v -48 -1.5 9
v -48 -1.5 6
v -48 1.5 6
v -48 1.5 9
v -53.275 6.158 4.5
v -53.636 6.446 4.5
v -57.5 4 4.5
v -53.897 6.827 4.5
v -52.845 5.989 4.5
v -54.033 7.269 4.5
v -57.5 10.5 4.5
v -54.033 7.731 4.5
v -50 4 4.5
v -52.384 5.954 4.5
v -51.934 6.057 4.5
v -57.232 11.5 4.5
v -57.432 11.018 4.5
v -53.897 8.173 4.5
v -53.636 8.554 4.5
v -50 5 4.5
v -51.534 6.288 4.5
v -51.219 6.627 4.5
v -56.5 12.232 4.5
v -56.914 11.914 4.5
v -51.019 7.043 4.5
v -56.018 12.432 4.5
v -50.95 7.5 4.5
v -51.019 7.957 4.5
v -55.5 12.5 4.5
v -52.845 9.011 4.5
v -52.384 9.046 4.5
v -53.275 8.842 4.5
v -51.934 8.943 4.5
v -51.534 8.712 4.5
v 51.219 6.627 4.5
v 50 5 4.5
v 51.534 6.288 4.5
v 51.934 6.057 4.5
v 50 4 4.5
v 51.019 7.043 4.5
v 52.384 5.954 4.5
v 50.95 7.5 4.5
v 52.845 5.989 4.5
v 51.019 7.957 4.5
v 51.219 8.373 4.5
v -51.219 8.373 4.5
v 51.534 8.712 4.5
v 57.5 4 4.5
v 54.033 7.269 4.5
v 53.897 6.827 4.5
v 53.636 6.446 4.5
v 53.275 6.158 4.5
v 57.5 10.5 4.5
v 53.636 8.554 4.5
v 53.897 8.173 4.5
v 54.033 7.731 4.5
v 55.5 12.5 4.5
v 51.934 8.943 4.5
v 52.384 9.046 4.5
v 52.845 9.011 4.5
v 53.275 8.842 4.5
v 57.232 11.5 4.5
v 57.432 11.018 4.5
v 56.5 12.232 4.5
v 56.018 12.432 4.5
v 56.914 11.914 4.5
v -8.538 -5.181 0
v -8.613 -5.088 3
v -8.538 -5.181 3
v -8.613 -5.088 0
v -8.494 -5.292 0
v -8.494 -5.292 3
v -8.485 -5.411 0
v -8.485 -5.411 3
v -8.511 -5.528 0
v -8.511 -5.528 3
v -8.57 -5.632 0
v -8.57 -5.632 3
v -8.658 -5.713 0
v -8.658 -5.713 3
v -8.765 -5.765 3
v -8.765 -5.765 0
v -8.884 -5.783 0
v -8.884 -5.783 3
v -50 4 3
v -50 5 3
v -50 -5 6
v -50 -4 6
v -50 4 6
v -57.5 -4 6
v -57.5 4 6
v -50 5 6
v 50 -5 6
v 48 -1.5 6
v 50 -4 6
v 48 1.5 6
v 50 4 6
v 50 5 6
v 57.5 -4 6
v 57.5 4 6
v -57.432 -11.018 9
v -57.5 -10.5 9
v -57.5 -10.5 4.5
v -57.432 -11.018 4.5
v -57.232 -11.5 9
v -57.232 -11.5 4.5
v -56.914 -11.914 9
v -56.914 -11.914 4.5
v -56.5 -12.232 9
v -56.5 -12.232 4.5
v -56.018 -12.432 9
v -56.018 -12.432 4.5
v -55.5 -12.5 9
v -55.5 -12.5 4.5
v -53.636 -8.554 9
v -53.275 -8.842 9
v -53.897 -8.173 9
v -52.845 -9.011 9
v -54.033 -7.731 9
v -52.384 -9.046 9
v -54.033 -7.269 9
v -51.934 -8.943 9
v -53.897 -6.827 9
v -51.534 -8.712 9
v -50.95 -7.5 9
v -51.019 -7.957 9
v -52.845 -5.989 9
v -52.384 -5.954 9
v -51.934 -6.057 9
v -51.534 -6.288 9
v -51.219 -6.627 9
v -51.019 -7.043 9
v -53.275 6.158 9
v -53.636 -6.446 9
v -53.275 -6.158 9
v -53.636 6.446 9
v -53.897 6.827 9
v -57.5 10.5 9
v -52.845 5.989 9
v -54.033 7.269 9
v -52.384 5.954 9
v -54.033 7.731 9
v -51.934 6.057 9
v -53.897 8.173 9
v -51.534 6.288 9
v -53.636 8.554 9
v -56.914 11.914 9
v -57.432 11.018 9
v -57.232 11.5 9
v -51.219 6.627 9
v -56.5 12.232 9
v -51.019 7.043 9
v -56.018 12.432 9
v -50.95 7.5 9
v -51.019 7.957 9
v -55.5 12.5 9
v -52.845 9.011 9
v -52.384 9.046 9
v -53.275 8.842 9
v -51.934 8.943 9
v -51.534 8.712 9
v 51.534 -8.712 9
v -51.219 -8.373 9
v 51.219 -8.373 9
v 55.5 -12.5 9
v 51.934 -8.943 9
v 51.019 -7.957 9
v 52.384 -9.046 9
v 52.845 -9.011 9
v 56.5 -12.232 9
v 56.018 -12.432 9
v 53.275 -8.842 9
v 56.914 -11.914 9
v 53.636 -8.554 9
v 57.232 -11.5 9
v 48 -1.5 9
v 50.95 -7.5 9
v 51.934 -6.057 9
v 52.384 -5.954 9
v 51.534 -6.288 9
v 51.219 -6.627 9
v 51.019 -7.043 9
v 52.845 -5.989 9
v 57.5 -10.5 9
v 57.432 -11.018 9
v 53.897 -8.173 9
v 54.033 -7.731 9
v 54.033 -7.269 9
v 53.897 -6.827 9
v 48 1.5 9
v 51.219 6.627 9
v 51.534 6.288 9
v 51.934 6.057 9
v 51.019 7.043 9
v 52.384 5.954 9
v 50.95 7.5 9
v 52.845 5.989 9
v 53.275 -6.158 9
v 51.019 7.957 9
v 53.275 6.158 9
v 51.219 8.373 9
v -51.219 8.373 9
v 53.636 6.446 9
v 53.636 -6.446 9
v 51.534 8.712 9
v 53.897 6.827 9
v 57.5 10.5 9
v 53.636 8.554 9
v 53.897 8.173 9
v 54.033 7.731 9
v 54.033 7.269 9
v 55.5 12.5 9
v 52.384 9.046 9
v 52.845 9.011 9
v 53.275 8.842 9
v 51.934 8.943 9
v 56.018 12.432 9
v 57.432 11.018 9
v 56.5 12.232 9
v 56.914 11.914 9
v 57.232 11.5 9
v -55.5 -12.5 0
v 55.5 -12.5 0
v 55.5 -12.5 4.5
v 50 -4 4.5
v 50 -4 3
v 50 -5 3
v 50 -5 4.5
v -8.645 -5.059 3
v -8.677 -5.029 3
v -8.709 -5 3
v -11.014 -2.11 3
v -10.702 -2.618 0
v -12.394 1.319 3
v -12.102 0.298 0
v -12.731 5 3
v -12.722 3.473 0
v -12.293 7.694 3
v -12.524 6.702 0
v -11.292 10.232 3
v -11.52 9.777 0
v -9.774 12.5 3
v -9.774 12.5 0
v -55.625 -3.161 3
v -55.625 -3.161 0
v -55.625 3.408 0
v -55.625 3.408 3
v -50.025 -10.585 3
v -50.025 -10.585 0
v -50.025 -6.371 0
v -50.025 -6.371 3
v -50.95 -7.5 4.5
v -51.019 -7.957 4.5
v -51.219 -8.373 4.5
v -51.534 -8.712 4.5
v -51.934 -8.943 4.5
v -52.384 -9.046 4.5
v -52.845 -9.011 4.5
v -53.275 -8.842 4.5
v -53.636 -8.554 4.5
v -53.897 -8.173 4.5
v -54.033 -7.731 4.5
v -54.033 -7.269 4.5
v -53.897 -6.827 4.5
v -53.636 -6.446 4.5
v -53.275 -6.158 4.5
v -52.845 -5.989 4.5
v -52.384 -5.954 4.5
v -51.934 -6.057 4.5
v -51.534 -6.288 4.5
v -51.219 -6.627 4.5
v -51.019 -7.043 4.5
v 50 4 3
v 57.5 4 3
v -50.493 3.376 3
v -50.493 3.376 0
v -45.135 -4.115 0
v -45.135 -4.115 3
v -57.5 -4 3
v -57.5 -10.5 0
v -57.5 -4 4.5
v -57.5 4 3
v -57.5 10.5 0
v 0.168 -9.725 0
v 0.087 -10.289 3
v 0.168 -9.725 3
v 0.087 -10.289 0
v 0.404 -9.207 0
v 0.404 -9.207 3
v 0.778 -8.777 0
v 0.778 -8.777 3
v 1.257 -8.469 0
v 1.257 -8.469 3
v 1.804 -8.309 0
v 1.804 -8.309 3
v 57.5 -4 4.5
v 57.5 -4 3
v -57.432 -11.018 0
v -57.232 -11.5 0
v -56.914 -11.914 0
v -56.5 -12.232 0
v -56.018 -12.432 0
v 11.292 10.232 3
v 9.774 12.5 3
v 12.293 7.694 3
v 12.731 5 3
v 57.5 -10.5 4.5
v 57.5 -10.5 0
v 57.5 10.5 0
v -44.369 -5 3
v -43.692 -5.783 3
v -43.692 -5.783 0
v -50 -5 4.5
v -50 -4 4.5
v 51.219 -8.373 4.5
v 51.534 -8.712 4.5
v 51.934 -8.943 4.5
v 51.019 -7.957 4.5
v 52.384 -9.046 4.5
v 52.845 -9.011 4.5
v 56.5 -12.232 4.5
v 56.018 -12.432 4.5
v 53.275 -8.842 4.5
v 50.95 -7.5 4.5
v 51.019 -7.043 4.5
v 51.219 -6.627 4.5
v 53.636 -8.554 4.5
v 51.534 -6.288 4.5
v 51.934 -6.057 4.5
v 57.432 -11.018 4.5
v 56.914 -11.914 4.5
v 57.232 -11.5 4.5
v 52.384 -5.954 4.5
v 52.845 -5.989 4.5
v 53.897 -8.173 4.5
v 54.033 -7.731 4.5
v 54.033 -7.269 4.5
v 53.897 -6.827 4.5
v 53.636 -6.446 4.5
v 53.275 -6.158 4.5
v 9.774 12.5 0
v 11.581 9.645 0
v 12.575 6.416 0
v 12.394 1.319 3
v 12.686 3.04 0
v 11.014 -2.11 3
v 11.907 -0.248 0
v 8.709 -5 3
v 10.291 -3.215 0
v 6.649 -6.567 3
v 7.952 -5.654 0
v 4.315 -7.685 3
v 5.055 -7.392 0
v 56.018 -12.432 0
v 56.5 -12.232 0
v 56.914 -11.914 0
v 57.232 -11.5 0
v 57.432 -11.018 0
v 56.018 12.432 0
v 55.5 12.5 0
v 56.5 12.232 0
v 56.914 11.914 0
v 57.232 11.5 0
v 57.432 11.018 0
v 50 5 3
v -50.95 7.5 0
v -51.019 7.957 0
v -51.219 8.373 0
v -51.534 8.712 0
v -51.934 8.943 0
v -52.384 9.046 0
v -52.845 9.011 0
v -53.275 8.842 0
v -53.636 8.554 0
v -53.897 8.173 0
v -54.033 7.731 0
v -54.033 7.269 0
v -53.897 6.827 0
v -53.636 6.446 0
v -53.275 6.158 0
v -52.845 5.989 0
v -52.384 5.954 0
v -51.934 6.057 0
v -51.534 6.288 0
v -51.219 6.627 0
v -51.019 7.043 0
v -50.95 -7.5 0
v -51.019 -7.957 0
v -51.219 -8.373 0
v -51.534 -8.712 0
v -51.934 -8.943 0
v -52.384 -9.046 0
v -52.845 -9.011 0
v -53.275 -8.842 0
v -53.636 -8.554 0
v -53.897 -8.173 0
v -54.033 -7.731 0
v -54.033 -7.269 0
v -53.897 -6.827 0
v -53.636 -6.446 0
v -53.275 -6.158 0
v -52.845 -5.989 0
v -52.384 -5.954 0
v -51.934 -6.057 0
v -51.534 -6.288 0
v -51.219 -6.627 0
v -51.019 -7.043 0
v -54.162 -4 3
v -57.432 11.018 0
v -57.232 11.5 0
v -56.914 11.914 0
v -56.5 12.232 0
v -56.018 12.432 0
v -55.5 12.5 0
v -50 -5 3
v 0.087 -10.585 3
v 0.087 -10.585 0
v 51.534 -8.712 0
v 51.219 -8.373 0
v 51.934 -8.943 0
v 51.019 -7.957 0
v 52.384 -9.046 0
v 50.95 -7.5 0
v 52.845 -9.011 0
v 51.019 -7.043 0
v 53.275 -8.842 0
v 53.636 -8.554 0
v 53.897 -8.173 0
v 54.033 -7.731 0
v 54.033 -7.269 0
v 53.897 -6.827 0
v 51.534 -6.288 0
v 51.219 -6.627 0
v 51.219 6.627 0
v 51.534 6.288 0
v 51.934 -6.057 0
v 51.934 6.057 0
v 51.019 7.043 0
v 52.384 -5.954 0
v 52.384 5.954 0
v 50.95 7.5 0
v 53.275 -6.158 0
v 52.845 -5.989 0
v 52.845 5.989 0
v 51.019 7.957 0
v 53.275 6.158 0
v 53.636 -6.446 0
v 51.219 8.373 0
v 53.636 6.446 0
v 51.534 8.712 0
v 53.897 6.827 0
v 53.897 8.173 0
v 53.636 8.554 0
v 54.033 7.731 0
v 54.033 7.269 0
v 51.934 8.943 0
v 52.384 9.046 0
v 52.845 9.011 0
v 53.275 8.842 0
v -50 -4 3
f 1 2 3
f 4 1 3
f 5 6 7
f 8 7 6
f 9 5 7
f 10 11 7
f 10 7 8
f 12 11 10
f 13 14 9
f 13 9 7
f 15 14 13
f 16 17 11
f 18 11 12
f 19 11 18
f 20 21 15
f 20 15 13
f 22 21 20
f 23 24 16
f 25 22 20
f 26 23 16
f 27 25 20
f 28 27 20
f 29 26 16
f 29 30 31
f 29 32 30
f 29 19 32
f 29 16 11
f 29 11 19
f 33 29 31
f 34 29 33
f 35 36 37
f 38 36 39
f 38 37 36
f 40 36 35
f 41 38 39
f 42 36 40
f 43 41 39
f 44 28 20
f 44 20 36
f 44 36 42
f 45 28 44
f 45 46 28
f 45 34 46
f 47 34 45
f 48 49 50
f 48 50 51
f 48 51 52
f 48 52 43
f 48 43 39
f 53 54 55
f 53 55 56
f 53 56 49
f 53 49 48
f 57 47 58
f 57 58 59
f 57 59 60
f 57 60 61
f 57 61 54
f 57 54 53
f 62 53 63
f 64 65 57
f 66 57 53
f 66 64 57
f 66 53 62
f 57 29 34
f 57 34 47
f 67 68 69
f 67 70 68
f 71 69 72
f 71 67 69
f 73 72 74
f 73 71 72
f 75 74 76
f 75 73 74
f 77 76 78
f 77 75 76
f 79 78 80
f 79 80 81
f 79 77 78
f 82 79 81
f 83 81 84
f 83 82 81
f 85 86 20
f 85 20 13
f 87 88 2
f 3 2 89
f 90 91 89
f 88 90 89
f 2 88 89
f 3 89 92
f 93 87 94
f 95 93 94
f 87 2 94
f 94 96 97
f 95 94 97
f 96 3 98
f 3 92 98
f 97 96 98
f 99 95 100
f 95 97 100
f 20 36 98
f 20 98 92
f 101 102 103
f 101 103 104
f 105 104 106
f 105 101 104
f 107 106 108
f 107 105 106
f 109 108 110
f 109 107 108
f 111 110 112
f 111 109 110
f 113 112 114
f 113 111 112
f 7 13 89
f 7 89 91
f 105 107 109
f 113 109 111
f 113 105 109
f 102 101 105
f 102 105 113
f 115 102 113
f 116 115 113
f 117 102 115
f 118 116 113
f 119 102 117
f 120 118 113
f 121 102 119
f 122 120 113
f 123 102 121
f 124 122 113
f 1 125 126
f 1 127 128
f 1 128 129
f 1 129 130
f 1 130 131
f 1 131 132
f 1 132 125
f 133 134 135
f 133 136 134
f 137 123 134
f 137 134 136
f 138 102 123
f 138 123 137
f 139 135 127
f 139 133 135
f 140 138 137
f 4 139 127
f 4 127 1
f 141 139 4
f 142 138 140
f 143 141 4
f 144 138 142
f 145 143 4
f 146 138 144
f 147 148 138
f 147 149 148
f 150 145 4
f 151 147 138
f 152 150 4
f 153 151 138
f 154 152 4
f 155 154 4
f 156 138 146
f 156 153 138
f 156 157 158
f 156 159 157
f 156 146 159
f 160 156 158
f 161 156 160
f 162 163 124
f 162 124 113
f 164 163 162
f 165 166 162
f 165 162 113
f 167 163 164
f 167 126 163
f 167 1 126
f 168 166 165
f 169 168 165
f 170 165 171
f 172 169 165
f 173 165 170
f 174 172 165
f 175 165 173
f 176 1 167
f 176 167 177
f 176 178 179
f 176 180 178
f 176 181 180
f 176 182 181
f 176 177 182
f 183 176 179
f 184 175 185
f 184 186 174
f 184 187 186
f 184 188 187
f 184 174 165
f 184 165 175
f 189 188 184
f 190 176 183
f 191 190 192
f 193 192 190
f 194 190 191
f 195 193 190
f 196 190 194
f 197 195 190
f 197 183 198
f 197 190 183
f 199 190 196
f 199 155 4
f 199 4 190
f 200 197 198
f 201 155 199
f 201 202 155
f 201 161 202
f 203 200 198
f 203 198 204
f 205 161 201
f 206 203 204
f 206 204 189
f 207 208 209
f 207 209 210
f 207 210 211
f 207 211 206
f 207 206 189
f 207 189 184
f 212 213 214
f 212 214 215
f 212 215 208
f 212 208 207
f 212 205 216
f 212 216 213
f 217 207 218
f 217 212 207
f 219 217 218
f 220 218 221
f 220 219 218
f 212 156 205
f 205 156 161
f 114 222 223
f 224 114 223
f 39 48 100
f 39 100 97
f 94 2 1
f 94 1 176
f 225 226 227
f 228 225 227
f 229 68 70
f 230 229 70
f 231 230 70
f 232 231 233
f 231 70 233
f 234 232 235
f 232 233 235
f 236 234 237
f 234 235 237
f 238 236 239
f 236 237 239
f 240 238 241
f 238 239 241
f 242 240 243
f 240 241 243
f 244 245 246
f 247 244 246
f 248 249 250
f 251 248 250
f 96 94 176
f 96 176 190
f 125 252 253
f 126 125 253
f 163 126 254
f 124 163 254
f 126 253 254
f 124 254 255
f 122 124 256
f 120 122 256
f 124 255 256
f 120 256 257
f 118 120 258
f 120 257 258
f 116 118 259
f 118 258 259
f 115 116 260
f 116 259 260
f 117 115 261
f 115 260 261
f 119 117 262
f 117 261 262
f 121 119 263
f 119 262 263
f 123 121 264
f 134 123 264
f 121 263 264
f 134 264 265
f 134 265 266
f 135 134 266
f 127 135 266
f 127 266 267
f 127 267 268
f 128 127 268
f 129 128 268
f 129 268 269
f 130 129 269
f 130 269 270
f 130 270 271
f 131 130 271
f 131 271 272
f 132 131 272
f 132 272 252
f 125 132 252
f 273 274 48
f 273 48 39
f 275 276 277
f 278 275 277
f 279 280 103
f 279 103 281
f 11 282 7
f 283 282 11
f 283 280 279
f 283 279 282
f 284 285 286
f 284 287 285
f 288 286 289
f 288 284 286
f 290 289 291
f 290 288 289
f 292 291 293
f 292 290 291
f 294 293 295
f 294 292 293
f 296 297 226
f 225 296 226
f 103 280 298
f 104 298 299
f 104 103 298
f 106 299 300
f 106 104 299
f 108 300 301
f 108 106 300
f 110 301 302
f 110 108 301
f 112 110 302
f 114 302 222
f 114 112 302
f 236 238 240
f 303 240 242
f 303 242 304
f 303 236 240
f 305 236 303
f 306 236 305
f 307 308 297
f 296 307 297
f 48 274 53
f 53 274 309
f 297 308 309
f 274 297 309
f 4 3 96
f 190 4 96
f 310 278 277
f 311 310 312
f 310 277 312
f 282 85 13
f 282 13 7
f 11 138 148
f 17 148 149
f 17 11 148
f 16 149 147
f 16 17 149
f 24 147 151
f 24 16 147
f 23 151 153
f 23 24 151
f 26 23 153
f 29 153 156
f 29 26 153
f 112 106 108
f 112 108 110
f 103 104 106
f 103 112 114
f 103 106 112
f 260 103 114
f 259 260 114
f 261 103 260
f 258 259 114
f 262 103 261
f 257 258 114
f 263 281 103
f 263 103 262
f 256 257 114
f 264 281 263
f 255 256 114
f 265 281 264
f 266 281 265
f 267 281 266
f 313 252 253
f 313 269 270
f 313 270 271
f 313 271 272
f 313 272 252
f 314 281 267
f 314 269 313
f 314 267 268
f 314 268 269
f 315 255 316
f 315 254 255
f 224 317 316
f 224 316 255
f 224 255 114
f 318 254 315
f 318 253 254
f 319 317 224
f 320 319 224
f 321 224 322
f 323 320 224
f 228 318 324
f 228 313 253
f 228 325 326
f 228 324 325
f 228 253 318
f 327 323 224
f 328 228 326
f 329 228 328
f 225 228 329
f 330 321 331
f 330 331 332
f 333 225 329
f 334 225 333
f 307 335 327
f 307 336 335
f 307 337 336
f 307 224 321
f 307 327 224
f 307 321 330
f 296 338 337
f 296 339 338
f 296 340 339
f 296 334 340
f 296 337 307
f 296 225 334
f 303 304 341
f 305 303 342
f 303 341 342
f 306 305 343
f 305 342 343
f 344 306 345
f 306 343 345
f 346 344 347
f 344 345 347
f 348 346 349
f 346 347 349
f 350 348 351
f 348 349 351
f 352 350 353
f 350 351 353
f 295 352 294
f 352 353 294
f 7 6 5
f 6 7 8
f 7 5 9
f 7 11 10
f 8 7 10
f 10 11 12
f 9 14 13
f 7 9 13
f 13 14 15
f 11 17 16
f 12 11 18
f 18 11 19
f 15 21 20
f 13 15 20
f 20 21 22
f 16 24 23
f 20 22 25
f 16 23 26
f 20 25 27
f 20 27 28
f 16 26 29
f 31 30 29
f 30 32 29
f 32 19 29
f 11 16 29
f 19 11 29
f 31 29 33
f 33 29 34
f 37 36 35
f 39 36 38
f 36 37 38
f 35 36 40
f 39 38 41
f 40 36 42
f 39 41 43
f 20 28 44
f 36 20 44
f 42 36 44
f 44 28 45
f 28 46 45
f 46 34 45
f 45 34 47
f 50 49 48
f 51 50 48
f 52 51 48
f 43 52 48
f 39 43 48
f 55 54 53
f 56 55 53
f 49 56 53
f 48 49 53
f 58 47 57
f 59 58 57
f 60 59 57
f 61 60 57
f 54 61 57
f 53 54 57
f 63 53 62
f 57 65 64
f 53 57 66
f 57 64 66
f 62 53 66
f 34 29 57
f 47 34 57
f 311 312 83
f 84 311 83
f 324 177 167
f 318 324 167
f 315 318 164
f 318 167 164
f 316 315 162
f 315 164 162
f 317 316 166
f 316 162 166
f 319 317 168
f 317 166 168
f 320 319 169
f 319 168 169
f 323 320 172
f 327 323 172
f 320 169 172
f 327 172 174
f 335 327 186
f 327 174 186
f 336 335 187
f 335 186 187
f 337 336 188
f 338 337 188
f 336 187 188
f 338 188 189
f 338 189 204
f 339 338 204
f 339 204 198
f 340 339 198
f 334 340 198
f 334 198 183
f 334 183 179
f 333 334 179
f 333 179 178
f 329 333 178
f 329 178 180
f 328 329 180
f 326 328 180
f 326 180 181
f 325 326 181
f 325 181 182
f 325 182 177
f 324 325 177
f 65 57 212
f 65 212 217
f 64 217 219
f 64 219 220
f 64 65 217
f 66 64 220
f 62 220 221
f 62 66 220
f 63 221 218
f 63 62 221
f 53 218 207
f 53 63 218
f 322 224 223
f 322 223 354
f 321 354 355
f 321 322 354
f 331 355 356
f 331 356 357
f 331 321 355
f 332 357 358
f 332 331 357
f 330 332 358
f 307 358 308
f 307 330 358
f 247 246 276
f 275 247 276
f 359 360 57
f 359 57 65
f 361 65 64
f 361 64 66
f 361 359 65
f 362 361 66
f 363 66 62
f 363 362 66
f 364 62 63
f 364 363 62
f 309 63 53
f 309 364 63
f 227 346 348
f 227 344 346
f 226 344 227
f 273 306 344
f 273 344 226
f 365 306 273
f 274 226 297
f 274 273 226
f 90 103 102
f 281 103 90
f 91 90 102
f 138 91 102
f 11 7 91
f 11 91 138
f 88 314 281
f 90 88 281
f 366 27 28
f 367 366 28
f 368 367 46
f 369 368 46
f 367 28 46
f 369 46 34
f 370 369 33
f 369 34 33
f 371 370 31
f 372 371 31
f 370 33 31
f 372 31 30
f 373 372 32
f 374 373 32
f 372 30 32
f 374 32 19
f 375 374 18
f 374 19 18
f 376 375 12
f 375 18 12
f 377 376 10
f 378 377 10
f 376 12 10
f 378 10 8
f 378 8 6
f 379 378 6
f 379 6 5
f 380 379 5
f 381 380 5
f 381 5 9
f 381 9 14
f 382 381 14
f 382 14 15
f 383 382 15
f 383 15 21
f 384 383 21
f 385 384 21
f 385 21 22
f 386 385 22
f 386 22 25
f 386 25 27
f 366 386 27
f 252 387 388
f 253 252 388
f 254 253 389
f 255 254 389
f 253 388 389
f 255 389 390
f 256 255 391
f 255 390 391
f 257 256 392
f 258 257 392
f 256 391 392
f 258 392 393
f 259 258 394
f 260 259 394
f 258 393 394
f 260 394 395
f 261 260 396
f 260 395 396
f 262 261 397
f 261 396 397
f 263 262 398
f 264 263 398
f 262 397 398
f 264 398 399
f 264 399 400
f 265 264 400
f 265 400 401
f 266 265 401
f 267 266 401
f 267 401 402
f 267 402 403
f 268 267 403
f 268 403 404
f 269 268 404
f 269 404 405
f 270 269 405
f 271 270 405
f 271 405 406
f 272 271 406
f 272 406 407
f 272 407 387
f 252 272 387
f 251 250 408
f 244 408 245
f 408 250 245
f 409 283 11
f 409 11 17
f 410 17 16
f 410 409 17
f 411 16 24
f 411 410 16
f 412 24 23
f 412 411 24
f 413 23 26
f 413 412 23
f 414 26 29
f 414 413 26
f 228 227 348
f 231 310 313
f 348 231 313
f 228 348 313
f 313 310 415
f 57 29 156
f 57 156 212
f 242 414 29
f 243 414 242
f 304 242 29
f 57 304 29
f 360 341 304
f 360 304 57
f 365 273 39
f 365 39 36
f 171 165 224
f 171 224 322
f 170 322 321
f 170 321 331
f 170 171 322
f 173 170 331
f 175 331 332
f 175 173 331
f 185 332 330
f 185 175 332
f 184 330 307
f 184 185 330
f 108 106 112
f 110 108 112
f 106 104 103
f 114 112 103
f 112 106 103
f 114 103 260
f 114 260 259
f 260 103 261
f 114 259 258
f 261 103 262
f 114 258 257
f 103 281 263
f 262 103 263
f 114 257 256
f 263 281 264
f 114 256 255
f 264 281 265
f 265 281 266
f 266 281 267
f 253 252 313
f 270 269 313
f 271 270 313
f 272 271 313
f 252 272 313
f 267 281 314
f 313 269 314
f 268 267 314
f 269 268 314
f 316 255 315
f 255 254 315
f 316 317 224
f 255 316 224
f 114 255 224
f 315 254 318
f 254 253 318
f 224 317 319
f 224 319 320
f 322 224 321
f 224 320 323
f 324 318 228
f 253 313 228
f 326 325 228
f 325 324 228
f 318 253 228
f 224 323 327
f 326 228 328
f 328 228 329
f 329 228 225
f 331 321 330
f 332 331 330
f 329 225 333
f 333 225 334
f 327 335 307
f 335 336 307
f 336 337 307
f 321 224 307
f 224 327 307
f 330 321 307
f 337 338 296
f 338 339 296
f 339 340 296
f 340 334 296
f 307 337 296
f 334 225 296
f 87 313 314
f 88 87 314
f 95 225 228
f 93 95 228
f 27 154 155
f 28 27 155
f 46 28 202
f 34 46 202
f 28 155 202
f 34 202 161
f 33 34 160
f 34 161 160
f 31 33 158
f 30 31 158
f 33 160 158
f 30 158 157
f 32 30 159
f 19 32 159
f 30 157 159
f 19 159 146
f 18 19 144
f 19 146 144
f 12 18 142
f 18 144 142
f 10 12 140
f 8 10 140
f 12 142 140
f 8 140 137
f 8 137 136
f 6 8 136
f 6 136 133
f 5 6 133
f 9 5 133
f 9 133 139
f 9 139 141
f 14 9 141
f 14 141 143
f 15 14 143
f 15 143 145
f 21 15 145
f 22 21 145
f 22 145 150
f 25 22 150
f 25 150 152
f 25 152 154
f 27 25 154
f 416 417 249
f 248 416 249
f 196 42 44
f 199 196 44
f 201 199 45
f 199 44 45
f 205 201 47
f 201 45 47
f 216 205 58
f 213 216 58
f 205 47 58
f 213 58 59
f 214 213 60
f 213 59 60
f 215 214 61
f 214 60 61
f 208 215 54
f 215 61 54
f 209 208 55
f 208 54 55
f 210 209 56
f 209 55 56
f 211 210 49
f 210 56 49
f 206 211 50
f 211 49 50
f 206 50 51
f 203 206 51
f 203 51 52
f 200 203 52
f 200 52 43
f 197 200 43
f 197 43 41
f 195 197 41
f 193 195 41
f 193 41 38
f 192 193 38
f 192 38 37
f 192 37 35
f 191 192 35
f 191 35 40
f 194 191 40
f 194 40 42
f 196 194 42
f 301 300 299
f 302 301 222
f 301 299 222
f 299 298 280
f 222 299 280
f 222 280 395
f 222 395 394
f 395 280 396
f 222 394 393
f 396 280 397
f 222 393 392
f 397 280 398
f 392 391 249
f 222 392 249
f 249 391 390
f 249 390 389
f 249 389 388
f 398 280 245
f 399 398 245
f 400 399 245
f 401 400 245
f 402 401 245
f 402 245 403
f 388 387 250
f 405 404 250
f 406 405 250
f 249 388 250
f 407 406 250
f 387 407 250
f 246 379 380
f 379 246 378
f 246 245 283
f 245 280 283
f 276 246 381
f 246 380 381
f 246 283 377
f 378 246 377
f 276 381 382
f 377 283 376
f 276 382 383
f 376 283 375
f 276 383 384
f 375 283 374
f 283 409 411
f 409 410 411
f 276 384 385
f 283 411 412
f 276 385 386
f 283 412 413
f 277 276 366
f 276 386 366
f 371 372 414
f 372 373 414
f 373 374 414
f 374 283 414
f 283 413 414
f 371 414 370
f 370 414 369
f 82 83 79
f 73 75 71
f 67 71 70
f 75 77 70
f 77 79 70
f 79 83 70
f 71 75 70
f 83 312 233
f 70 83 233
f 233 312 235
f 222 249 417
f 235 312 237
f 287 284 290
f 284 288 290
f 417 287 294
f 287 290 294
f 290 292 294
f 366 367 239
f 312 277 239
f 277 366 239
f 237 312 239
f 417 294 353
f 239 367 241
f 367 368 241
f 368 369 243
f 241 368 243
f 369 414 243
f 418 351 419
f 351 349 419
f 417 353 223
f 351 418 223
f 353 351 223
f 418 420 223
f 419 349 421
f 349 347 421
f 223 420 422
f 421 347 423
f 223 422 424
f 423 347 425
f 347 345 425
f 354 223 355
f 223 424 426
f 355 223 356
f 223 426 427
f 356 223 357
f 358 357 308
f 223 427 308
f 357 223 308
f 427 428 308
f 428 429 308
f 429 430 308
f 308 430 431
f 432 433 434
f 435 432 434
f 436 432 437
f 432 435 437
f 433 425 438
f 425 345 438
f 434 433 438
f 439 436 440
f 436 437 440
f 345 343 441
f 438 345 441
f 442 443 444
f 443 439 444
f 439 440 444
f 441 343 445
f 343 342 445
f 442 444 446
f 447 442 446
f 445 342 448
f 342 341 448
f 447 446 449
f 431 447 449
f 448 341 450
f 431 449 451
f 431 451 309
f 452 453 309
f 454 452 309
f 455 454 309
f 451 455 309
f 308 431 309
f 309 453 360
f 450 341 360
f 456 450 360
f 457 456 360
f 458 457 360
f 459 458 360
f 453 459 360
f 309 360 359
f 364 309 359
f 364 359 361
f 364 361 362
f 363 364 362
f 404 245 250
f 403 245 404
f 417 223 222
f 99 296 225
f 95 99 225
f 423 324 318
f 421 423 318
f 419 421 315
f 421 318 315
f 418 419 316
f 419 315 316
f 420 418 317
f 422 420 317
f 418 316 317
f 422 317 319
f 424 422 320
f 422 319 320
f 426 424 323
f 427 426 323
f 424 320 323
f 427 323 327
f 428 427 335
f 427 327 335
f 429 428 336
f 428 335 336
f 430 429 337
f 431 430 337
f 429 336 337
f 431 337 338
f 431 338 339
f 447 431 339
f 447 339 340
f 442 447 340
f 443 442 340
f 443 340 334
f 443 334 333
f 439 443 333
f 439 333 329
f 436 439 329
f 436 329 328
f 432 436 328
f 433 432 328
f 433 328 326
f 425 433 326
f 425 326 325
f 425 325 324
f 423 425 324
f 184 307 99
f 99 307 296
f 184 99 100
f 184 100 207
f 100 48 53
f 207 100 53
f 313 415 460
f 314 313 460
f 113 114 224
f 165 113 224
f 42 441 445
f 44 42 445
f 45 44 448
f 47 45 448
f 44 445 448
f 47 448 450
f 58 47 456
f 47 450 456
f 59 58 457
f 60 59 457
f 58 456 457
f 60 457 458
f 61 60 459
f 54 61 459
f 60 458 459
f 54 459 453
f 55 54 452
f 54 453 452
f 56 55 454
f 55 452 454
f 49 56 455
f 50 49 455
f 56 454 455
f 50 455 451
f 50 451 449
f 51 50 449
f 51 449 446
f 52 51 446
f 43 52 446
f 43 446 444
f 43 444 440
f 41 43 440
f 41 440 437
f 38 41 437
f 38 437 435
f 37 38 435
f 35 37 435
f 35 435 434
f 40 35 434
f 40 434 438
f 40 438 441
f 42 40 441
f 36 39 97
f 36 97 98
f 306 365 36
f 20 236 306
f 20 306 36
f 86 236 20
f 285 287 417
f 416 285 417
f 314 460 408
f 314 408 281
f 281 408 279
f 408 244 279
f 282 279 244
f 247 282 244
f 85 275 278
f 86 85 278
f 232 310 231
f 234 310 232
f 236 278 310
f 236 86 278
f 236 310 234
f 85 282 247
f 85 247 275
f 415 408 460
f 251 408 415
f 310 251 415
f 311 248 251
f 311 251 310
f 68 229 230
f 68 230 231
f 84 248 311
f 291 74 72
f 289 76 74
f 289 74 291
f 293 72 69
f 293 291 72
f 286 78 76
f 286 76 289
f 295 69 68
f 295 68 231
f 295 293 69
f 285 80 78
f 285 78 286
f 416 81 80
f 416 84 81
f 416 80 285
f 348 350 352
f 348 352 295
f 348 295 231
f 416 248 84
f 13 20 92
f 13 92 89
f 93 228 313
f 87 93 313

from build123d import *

# Parameters (mm, degrees)
BOX_BOTTOM_HALF_0_W     = 117
BOX_BOTTOM_HALF_0_H     = 27
BOX_BOTTOM_HALF_0_DEPTH = 5.5
SKETCH_W                = 115
SKETCH_H                = 25
PAD_DEPTH               = 3
PAD001_DEPTH            = 3
SKETCH002_W             = 115
SKETCH002_H             = 25
SKETCH002_W_2           = 96
SKETCH002_H_2           = 3
PAD002_DEPTH            = 3
SKETCH003_R             = 1.55
POCKET_DEPTH            = 245.060315
POLARPATTERN_COUNT      = 2
POLARPATTERN001_COUNT   = 2
POLARPATTERN002_COUNT   = 2
FILLET_R                = 2
SKETCH004_R             = 12.75
POCKET001_DEPTH         = 3
POCKET002_DEPTH         = 3
FILLET001_R             = 0.4
FILLET002_R             = 2


with BuildPart() as box_bottom_half_0_body:
    # box_bottom_half_0 → box_bottom_half_0 (new body)
    with BuildSketch(Plane(origin=(-58.5, -13.5, -1), x_dir=(1, 0, 0), z_dir=(0, 0, 1))):
        with Locations((58.5, 13.5)):
            Rectangle(BOX_BOTTOM_HALF_0_W, BOX_BOTTOM_HALF_0_H)
    extrude(amount=BOX_BOTTOM_HALF_0_DEPTH)


with BuildPart() as body:
    # Sketch → Pad (new body)
    with BuildSketch(Plane.XY):
        Rectangle(SKETCH_W, SKETCH_H)
    extrude(amount=PAD_DEPTH)

    # Sketch001 (on Face6 of Pad) → Pad001 (join)
    with BuildSketch(Plane.XY.offset(3)):
        Polygon((-57.5, 12.5), (57.5, 12.5), (57.5, 4), (50, 4), (50, 5), (-50, 5), (-50, 4), (-57.5, 4), align=None)
        Polygon((-57.5, -12.5), (57.5, -12.5), (57.5, -4), (50, -4), (50, -5), (-50, -5), (-50, -4), (-57.5, -4), align=None)
    extrude(amount=PAD001_DEPTH)

    # Sketch002 (on Face12 of Pad001) → Pad002 (join)
    with BuildSketch(Plane.XY.offset(6)):
        Rectangle(SKETCH002_W, SKETCH002_H)
        Rectangle(SKETCH002_W_2, SKETCH002_H_2, mode=Mode.SUBTRACT)
    extrude(amount=PAD002_DEPTH)

    # Sketch003 (on Face26 of Pad002) → Pocket (cut, through all)
    with BuildSketch(Plane.XY.offset(9)):
        with Locations((-52.5, 7.5)):
            Circle(SKETCH003_R)
    pocket = extrude(amount=-POCKET_DEPTH, mode=Mode.SUBTRACT)

    # PolarPattern: Pocket ×2 about axis
    polarpattern_axis = Axis((0, 0, 0), (0, 1, 0))
    for i in range(1, POLARPATTERN_COUNT):
        add(pocket.rotate(polarpattern_axis, i * 360 / POLARPATTERN_COUNT), mode=Mode.SUBTRACT)

    # PolarPattern001: Pocket ×2 about axis
    polarpattern001_axis = Axis((0, 0, 0), (1, 0, 0))
    for i in range(1, POLARPATTERN001_COUNT):
        add(pocket.rotate(polarpattern001_axis, i * 360 / POLARPATTERN001_COUNT), mode=Mode.SUBTRACT)

    # PolarPattern002: Pocket ×2 about axis
    polarpattern002_axis = Axis((0, 0, 9), (0, 0, 1))
    for i in range(1, POLARPATTERN002_COUNT):
        add(pocket.rotate(polarpattern002_axis, i * 360 / POLARPATTERN002_COUNT), mode=Mode.SUBTRACT)

    # Fillet
    fillet_edges = [body.edges().sort_by_distance(p)[0] for p in [
        (57.5, 12.5, 7.5),
        (57.5, 12.5, 4.5),
        (57.5, 12.5, 1.5),
        (57.5, -12.5, 7.5),
        (-57.5, 12.5, 7.5),
        (-57.5, -12.5, 7.5),
    ]]
    fillet(fillet_edges, radius=FILLET_R)

    # Sketch004 (on Face2 of Fillet) → Pocket001 (cut)
    with BuildSketch(Plane(origin=(0, 0, 0), x_dir=(1, 0, 0), z_dir=(0, 0, -1))):
        with Locations((0, -4.31247)):
            Circle(SKETCH004_R)
    extrude(amount=-POCKET001_DEPTH, mode=Mode.SUBTRACT)

    # Sketch005 (on Face2 of Pocket001) → Pocket002 (cut)
    with BuildSketch(Plane(origin=(0, 0, 0), x_dir=(1, 0, 0), z_dir=(0, 0, -1))):
        Polygon((0.086598, 10.584693), (-50.025204, 10.584693), (-50.025204, 6.371434), (-55.624748, 3.161258), (-55.624748, -3.408425), (-50.493088, -3.376352), (-45.134857, 4.115264), (-43.691578, 5.783052), (0.086598, 5.783052), align=None)
    extrude(amount=-POCKET002_DEPTH, mode=Mode.SUBTRACT)

    # Fillet001
    fillet001_edges = [body.edges().sort_by_distance(p)[0] for p in [
        (-7.787357, -5.783052, 1.5),
    ]]
    fillet(fillet001_edges, radius=FILLET001_R)

    # Fillet002
    fillet002_edges = [body.edges().sort_by_distance(p)[0] for p in [
        (0.086598, -8.437236, 1.5),
    ]]
    fillet(fillet002_edges, radius=FILLET002_R)


with BuildPart() as bottom_half_0_body:
    # bottom_half_0 base: copy of Body
    add(body.part)

    # bottom_half_0: intersect box_bottom_half_0 body
    add(box_bottom_half_0_body.part, mode=Mode.INTERSECT)


with BuildPart() as top_half_0_body:
    # top_half_0 base: copy of Body
    add(body.part)

    # top_half_0: cut box_bottom_half_0 body
    add(box_bottom_half_0_body.part, mode=Mode.SUBTRACT)


solid = Compound([bottom_half_0_body.part, top_half_0_body.part])
